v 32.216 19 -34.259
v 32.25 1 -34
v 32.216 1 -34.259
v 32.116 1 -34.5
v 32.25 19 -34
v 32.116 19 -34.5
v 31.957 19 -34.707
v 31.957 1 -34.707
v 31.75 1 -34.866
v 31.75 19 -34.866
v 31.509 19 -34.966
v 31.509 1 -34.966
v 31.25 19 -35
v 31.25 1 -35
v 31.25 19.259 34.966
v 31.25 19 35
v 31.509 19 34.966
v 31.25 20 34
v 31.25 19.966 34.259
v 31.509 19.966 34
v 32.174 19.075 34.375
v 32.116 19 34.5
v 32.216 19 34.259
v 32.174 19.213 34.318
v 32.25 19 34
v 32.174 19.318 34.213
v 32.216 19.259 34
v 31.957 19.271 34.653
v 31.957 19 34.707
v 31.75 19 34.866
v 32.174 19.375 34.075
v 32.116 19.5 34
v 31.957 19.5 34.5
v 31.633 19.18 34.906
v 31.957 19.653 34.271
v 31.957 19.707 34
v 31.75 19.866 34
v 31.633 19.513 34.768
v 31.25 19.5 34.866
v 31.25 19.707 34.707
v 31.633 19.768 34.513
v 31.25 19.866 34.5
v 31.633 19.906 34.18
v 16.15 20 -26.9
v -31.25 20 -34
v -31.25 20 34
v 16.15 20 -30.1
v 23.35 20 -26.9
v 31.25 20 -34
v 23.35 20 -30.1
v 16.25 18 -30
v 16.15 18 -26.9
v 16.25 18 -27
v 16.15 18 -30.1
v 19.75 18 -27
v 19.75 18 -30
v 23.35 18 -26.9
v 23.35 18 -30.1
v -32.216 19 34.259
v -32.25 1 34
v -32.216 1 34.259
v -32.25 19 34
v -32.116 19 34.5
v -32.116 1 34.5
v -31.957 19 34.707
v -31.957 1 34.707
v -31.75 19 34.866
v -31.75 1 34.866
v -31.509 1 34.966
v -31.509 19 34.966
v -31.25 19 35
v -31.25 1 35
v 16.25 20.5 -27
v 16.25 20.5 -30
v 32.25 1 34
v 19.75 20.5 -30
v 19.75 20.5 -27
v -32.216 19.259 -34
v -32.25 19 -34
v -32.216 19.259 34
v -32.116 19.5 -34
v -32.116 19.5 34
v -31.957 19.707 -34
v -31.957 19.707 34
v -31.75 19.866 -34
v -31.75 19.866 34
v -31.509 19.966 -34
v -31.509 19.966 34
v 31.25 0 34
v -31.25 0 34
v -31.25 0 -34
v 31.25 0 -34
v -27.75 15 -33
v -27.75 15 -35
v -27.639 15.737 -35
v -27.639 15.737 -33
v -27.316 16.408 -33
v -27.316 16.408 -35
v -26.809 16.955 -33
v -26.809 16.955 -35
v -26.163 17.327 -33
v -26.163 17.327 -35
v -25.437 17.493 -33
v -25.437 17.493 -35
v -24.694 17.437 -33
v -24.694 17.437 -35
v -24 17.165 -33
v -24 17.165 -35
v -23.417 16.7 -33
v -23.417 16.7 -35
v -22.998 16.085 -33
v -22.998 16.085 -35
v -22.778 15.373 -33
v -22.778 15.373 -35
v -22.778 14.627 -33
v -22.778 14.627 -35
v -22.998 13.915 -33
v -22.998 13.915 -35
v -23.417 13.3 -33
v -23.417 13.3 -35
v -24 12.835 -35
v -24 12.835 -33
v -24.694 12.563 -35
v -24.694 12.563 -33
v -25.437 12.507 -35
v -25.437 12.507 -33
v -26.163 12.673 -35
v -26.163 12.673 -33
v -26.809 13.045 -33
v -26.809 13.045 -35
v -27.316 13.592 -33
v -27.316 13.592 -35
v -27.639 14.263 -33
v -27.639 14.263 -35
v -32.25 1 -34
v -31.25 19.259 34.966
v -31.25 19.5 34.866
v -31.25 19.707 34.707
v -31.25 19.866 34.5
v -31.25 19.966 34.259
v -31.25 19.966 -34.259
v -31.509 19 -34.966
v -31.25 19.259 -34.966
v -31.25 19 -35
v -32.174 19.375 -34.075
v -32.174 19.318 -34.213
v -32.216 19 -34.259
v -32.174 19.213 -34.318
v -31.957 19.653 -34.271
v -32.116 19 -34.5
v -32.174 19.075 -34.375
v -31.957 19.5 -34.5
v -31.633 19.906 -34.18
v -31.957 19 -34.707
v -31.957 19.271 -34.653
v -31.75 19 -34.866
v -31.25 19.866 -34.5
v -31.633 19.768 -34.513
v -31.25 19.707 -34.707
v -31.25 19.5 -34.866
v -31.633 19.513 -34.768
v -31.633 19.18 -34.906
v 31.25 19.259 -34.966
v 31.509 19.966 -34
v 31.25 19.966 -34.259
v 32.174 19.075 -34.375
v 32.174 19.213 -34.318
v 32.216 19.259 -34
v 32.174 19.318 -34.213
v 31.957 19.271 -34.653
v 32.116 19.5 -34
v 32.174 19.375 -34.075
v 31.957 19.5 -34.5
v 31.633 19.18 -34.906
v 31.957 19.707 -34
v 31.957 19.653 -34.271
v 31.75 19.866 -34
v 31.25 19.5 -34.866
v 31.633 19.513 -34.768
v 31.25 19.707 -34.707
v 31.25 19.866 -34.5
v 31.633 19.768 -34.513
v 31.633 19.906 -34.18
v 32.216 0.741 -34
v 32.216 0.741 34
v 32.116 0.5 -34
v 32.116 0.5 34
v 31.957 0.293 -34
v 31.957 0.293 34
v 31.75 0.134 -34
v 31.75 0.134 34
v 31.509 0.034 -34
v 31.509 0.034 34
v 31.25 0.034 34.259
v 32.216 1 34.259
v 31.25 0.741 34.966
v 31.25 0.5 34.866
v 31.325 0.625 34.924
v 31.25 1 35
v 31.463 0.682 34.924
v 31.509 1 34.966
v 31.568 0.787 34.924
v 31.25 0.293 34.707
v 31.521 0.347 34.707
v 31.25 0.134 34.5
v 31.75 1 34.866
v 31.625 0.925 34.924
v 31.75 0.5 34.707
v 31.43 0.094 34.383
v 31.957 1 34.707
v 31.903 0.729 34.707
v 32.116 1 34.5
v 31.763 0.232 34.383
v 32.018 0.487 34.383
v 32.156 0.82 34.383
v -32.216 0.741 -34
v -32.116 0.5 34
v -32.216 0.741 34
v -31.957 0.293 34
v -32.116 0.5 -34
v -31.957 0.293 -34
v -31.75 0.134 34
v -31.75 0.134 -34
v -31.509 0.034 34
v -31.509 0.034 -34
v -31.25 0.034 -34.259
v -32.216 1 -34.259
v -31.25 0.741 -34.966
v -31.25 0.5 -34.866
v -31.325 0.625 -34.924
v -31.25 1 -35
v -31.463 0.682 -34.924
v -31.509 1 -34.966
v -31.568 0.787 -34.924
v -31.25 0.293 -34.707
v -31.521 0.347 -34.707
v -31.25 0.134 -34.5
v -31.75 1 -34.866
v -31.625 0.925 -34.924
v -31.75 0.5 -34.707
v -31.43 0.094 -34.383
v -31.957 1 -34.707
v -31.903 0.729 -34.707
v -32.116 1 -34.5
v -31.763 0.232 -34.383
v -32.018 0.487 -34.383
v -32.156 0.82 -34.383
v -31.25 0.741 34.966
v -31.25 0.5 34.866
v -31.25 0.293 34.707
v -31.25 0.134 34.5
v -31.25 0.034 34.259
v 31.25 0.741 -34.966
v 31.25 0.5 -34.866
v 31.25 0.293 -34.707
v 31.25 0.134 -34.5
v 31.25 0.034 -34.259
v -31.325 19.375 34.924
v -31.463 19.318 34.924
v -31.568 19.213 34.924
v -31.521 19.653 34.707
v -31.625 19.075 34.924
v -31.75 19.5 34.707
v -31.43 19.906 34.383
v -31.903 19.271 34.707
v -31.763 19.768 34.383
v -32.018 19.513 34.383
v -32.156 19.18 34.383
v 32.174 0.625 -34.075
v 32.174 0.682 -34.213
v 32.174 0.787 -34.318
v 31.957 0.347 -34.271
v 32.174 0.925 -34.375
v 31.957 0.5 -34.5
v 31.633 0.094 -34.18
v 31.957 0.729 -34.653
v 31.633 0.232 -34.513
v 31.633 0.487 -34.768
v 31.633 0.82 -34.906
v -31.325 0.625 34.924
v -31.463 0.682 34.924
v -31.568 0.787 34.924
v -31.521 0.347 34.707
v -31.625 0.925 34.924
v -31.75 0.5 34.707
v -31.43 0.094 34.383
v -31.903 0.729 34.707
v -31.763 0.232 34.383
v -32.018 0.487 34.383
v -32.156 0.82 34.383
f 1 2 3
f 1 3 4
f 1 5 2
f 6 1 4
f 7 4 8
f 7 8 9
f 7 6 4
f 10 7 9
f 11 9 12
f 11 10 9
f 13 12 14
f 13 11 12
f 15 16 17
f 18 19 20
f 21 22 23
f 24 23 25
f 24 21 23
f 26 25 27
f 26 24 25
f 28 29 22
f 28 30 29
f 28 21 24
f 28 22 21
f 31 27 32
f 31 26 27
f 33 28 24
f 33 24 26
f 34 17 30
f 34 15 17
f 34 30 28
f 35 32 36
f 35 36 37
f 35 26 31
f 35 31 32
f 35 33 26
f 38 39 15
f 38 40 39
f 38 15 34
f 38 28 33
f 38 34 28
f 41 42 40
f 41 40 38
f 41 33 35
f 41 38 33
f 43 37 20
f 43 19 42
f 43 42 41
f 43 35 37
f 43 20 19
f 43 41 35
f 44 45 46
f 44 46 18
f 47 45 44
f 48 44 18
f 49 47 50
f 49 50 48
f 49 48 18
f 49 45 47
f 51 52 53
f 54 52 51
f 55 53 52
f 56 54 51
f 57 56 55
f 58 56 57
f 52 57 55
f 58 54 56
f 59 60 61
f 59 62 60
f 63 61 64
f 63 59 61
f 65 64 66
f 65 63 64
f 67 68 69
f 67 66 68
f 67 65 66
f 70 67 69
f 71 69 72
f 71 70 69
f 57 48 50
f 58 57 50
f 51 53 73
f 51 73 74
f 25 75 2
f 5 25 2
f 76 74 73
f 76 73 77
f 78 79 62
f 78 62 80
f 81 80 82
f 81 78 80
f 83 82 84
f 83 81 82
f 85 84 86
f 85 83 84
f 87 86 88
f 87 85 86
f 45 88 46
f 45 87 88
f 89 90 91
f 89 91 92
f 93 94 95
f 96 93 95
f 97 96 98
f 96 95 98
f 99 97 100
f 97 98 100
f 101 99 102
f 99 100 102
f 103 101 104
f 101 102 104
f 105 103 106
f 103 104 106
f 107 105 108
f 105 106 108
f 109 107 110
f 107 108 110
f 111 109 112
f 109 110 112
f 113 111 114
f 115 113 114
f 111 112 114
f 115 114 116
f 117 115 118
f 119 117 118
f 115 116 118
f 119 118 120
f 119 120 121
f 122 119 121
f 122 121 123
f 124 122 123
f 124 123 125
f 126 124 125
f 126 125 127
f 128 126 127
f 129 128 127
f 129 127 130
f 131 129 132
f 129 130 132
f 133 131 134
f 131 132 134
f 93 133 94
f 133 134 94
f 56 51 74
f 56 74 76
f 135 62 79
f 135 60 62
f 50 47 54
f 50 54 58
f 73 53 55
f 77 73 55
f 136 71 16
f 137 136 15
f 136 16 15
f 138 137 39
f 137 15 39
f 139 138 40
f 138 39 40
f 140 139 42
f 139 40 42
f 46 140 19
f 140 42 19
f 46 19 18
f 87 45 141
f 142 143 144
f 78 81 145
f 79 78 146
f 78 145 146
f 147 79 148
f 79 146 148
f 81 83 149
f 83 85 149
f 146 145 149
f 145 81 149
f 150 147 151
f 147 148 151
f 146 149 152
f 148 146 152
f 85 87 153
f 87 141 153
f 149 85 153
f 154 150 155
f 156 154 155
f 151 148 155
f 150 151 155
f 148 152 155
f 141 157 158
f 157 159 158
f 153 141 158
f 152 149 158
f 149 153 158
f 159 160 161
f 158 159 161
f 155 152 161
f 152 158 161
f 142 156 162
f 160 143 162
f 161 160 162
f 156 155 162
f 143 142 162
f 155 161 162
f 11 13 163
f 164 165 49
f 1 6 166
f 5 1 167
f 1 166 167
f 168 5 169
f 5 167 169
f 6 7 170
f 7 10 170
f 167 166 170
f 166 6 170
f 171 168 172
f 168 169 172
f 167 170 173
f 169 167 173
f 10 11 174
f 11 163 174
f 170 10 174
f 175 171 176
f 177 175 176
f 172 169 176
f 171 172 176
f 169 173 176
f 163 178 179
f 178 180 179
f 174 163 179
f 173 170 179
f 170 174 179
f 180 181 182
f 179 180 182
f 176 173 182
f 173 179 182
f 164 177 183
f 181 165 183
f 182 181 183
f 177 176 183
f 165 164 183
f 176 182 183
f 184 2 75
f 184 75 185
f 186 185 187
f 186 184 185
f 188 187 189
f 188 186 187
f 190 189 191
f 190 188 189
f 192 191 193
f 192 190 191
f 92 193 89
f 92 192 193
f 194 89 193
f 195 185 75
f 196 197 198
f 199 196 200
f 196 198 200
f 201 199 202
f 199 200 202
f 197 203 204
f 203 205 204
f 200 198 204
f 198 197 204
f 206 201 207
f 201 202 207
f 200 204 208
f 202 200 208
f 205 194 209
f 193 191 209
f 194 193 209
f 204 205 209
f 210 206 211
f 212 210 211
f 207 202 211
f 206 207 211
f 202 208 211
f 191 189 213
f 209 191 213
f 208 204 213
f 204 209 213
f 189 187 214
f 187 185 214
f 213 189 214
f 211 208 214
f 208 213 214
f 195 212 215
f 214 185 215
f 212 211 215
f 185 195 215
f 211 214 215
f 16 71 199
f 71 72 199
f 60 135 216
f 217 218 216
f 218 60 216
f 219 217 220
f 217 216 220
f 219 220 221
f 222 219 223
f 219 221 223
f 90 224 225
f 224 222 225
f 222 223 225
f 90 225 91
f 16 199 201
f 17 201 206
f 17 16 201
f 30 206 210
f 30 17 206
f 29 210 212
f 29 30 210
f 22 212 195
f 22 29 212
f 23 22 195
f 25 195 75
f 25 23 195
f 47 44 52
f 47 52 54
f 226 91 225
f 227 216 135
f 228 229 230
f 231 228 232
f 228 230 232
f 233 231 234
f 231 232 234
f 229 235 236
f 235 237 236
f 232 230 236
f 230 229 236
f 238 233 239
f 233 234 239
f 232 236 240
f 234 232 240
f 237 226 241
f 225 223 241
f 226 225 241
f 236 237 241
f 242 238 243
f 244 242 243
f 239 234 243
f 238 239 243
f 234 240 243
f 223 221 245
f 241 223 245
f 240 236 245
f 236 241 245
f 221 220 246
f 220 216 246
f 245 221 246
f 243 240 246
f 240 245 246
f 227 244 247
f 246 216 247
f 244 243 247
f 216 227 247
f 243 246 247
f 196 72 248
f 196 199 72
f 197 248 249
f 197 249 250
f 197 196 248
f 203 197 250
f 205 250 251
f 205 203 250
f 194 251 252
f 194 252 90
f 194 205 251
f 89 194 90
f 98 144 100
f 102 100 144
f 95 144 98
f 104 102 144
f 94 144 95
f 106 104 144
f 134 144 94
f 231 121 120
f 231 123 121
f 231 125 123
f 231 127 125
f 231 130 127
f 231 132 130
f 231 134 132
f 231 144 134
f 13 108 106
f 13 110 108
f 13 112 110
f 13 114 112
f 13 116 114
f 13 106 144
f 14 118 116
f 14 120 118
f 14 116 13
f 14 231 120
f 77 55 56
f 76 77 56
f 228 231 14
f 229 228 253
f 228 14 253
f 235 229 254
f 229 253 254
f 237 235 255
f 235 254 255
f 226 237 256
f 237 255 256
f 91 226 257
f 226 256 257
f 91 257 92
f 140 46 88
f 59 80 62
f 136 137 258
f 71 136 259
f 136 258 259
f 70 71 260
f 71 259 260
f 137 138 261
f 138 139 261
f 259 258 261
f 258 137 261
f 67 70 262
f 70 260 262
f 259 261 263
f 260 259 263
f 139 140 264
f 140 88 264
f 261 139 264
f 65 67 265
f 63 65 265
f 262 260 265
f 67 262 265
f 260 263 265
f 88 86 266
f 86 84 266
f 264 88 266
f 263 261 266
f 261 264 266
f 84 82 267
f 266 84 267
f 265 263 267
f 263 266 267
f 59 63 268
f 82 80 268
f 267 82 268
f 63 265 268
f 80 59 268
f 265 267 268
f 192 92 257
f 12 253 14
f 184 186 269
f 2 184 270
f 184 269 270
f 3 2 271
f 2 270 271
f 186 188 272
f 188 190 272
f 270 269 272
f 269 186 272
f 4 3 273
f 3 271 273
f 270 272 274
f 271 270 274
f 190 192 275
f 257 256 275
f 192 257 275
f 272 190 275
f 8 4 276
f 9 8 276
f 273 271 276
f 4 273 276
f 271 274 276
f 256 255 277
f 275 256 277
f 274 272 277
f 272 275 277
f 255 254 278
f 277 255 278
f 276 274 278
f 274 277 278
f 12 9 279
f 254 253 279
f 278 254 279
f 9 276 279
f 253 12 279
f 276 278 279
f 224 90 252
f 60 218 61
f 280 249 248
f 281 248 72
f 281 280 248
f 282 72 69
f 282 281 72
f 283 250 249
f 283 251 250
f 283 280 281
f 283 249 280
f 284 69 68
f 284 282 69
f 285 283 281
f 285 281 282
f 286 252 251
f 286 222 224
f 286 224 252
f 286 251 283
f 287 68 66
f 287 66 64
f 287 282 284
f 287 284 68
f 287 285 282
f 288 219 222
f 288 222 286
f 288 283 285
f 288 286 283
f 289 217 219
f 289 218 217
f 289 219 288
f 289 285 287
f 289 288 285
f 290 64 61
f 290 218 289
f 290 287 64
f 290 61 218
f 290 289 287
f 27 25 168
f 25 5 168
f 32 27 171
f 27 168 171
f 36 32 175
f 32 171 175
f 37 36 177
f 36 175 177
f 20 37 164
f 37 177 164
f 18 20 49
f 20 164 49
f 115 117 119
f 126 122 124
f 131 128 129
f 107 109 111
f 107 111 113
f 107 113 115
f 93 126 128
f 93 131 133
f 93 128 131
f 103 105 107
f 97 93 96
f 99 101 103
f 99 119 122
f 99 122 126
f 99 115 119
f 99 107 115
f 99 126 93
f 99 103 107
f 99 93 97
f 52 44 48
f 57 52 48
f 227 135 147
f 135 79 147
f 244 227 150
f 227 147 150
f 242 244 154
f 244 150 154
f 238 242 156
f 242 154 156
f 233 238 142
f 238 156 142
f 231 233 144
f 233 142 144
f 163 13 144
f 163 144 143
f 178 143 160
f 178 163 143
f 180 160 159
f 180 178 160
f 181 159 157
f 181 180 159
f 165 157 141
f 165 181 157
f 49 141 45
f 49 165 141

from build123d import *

# Parameters (mm, degrees)
SKETCH_1_W          = 64.5
SKETCH_1_H          = 70
EXTRUDE_1_DEPTH     = 20
FILLET_1_R          = 1
CUT_EXTRUDE_START   = 20
SKETCH_1_9_W        = 7.2
SKETCH_1_9_H        = 3.2
CUT_EXTRUDE_1_DEPTH = 2
EXTRUDE_START       = 18
SKETCH_1_10_W       = 3.5
SKETCH_1_10_H       = 3
EXTRUDE_2_DEPTH     = 2.5
SKETCH_2_R          = 2.5
CUT_EXTRUDE_2_DEPTH = 2


with BuildPart() as part:
    # 草图1 → 凸台-拉伸1 (new body)
    with BuildSketch(Plane(origin=(0, 0, 0), x_dir=(1, 0, 0), z_dir=(0, 1, 0))):
        Rectangle(SKETCH_1_W, SKETCH_1_H)
    extrude(amount=EXTRUDE_1_DEPTH)

    # 圆角1
    fillet_1_edges = [part.edges().sort_by_distance(p)[0] for p in [
        (0, 20, -35),
        (-32.25, 20, 0),
        (0, 20, 35),
        (-32.25, 0, 0),
        (0, 0, -35),
        (32.25, 0, 0),
        (0, 0, 35),
        (-32.25, 10, 35),
        (-32.25, 10, -35),
        (32.25, 10, -35),
        (32.25, 10, 35),
        (32.25, 20, 0),
    ]]
    fillet(fillet_1_edges, radius=FILLET_1_R)

    # 草图1<9> → 切除-拉伸1 (cut)
    with BuildSketch(Plane(origin=(0, 0, 0), x_dir=(1, 0, 0), z_dir=(0, 1, 0)).offset(CUT_EXTRUDE_START)):
        with Locations((19.75, 28.5)):
            Rectangle(SKETCH_1_9_W, SKETCH_1_9_H)
    extrude(amount=-CUT_EXTRUDE_1_DEPTH, mode=Mode.SUBTRACT)

    # 草图1<10> → 凸台-拉伸2 (add)
    with BuildSketch(Plane(origin=(0, 0, 0), x_dir=(1, 0, 0), z_dir=(0, 1, 0)).offset(EXTRUDE_START)):
        with Locations((18, 28.5)):
            Rectangle(SKETCH_1_10_W, SKETCH_1_10_H)
    extrude(amount=EXTRUDE_2_DEPTH)

    # 草图2 → 切除-拉伸2 (cut)
    with BuildSketch(Plane(origin=(0, 0, -35), x_dir=(-1, 0, 0), z_dir=(0, 0, -1))):
        with Locations((25.25, 15)):
            Circle(SKETCH_2_R)
    extrude(amount=-CUT_EXTRUDE_2_DEPTH, mode=Mode.SUBTRACT)


solid = part.part
